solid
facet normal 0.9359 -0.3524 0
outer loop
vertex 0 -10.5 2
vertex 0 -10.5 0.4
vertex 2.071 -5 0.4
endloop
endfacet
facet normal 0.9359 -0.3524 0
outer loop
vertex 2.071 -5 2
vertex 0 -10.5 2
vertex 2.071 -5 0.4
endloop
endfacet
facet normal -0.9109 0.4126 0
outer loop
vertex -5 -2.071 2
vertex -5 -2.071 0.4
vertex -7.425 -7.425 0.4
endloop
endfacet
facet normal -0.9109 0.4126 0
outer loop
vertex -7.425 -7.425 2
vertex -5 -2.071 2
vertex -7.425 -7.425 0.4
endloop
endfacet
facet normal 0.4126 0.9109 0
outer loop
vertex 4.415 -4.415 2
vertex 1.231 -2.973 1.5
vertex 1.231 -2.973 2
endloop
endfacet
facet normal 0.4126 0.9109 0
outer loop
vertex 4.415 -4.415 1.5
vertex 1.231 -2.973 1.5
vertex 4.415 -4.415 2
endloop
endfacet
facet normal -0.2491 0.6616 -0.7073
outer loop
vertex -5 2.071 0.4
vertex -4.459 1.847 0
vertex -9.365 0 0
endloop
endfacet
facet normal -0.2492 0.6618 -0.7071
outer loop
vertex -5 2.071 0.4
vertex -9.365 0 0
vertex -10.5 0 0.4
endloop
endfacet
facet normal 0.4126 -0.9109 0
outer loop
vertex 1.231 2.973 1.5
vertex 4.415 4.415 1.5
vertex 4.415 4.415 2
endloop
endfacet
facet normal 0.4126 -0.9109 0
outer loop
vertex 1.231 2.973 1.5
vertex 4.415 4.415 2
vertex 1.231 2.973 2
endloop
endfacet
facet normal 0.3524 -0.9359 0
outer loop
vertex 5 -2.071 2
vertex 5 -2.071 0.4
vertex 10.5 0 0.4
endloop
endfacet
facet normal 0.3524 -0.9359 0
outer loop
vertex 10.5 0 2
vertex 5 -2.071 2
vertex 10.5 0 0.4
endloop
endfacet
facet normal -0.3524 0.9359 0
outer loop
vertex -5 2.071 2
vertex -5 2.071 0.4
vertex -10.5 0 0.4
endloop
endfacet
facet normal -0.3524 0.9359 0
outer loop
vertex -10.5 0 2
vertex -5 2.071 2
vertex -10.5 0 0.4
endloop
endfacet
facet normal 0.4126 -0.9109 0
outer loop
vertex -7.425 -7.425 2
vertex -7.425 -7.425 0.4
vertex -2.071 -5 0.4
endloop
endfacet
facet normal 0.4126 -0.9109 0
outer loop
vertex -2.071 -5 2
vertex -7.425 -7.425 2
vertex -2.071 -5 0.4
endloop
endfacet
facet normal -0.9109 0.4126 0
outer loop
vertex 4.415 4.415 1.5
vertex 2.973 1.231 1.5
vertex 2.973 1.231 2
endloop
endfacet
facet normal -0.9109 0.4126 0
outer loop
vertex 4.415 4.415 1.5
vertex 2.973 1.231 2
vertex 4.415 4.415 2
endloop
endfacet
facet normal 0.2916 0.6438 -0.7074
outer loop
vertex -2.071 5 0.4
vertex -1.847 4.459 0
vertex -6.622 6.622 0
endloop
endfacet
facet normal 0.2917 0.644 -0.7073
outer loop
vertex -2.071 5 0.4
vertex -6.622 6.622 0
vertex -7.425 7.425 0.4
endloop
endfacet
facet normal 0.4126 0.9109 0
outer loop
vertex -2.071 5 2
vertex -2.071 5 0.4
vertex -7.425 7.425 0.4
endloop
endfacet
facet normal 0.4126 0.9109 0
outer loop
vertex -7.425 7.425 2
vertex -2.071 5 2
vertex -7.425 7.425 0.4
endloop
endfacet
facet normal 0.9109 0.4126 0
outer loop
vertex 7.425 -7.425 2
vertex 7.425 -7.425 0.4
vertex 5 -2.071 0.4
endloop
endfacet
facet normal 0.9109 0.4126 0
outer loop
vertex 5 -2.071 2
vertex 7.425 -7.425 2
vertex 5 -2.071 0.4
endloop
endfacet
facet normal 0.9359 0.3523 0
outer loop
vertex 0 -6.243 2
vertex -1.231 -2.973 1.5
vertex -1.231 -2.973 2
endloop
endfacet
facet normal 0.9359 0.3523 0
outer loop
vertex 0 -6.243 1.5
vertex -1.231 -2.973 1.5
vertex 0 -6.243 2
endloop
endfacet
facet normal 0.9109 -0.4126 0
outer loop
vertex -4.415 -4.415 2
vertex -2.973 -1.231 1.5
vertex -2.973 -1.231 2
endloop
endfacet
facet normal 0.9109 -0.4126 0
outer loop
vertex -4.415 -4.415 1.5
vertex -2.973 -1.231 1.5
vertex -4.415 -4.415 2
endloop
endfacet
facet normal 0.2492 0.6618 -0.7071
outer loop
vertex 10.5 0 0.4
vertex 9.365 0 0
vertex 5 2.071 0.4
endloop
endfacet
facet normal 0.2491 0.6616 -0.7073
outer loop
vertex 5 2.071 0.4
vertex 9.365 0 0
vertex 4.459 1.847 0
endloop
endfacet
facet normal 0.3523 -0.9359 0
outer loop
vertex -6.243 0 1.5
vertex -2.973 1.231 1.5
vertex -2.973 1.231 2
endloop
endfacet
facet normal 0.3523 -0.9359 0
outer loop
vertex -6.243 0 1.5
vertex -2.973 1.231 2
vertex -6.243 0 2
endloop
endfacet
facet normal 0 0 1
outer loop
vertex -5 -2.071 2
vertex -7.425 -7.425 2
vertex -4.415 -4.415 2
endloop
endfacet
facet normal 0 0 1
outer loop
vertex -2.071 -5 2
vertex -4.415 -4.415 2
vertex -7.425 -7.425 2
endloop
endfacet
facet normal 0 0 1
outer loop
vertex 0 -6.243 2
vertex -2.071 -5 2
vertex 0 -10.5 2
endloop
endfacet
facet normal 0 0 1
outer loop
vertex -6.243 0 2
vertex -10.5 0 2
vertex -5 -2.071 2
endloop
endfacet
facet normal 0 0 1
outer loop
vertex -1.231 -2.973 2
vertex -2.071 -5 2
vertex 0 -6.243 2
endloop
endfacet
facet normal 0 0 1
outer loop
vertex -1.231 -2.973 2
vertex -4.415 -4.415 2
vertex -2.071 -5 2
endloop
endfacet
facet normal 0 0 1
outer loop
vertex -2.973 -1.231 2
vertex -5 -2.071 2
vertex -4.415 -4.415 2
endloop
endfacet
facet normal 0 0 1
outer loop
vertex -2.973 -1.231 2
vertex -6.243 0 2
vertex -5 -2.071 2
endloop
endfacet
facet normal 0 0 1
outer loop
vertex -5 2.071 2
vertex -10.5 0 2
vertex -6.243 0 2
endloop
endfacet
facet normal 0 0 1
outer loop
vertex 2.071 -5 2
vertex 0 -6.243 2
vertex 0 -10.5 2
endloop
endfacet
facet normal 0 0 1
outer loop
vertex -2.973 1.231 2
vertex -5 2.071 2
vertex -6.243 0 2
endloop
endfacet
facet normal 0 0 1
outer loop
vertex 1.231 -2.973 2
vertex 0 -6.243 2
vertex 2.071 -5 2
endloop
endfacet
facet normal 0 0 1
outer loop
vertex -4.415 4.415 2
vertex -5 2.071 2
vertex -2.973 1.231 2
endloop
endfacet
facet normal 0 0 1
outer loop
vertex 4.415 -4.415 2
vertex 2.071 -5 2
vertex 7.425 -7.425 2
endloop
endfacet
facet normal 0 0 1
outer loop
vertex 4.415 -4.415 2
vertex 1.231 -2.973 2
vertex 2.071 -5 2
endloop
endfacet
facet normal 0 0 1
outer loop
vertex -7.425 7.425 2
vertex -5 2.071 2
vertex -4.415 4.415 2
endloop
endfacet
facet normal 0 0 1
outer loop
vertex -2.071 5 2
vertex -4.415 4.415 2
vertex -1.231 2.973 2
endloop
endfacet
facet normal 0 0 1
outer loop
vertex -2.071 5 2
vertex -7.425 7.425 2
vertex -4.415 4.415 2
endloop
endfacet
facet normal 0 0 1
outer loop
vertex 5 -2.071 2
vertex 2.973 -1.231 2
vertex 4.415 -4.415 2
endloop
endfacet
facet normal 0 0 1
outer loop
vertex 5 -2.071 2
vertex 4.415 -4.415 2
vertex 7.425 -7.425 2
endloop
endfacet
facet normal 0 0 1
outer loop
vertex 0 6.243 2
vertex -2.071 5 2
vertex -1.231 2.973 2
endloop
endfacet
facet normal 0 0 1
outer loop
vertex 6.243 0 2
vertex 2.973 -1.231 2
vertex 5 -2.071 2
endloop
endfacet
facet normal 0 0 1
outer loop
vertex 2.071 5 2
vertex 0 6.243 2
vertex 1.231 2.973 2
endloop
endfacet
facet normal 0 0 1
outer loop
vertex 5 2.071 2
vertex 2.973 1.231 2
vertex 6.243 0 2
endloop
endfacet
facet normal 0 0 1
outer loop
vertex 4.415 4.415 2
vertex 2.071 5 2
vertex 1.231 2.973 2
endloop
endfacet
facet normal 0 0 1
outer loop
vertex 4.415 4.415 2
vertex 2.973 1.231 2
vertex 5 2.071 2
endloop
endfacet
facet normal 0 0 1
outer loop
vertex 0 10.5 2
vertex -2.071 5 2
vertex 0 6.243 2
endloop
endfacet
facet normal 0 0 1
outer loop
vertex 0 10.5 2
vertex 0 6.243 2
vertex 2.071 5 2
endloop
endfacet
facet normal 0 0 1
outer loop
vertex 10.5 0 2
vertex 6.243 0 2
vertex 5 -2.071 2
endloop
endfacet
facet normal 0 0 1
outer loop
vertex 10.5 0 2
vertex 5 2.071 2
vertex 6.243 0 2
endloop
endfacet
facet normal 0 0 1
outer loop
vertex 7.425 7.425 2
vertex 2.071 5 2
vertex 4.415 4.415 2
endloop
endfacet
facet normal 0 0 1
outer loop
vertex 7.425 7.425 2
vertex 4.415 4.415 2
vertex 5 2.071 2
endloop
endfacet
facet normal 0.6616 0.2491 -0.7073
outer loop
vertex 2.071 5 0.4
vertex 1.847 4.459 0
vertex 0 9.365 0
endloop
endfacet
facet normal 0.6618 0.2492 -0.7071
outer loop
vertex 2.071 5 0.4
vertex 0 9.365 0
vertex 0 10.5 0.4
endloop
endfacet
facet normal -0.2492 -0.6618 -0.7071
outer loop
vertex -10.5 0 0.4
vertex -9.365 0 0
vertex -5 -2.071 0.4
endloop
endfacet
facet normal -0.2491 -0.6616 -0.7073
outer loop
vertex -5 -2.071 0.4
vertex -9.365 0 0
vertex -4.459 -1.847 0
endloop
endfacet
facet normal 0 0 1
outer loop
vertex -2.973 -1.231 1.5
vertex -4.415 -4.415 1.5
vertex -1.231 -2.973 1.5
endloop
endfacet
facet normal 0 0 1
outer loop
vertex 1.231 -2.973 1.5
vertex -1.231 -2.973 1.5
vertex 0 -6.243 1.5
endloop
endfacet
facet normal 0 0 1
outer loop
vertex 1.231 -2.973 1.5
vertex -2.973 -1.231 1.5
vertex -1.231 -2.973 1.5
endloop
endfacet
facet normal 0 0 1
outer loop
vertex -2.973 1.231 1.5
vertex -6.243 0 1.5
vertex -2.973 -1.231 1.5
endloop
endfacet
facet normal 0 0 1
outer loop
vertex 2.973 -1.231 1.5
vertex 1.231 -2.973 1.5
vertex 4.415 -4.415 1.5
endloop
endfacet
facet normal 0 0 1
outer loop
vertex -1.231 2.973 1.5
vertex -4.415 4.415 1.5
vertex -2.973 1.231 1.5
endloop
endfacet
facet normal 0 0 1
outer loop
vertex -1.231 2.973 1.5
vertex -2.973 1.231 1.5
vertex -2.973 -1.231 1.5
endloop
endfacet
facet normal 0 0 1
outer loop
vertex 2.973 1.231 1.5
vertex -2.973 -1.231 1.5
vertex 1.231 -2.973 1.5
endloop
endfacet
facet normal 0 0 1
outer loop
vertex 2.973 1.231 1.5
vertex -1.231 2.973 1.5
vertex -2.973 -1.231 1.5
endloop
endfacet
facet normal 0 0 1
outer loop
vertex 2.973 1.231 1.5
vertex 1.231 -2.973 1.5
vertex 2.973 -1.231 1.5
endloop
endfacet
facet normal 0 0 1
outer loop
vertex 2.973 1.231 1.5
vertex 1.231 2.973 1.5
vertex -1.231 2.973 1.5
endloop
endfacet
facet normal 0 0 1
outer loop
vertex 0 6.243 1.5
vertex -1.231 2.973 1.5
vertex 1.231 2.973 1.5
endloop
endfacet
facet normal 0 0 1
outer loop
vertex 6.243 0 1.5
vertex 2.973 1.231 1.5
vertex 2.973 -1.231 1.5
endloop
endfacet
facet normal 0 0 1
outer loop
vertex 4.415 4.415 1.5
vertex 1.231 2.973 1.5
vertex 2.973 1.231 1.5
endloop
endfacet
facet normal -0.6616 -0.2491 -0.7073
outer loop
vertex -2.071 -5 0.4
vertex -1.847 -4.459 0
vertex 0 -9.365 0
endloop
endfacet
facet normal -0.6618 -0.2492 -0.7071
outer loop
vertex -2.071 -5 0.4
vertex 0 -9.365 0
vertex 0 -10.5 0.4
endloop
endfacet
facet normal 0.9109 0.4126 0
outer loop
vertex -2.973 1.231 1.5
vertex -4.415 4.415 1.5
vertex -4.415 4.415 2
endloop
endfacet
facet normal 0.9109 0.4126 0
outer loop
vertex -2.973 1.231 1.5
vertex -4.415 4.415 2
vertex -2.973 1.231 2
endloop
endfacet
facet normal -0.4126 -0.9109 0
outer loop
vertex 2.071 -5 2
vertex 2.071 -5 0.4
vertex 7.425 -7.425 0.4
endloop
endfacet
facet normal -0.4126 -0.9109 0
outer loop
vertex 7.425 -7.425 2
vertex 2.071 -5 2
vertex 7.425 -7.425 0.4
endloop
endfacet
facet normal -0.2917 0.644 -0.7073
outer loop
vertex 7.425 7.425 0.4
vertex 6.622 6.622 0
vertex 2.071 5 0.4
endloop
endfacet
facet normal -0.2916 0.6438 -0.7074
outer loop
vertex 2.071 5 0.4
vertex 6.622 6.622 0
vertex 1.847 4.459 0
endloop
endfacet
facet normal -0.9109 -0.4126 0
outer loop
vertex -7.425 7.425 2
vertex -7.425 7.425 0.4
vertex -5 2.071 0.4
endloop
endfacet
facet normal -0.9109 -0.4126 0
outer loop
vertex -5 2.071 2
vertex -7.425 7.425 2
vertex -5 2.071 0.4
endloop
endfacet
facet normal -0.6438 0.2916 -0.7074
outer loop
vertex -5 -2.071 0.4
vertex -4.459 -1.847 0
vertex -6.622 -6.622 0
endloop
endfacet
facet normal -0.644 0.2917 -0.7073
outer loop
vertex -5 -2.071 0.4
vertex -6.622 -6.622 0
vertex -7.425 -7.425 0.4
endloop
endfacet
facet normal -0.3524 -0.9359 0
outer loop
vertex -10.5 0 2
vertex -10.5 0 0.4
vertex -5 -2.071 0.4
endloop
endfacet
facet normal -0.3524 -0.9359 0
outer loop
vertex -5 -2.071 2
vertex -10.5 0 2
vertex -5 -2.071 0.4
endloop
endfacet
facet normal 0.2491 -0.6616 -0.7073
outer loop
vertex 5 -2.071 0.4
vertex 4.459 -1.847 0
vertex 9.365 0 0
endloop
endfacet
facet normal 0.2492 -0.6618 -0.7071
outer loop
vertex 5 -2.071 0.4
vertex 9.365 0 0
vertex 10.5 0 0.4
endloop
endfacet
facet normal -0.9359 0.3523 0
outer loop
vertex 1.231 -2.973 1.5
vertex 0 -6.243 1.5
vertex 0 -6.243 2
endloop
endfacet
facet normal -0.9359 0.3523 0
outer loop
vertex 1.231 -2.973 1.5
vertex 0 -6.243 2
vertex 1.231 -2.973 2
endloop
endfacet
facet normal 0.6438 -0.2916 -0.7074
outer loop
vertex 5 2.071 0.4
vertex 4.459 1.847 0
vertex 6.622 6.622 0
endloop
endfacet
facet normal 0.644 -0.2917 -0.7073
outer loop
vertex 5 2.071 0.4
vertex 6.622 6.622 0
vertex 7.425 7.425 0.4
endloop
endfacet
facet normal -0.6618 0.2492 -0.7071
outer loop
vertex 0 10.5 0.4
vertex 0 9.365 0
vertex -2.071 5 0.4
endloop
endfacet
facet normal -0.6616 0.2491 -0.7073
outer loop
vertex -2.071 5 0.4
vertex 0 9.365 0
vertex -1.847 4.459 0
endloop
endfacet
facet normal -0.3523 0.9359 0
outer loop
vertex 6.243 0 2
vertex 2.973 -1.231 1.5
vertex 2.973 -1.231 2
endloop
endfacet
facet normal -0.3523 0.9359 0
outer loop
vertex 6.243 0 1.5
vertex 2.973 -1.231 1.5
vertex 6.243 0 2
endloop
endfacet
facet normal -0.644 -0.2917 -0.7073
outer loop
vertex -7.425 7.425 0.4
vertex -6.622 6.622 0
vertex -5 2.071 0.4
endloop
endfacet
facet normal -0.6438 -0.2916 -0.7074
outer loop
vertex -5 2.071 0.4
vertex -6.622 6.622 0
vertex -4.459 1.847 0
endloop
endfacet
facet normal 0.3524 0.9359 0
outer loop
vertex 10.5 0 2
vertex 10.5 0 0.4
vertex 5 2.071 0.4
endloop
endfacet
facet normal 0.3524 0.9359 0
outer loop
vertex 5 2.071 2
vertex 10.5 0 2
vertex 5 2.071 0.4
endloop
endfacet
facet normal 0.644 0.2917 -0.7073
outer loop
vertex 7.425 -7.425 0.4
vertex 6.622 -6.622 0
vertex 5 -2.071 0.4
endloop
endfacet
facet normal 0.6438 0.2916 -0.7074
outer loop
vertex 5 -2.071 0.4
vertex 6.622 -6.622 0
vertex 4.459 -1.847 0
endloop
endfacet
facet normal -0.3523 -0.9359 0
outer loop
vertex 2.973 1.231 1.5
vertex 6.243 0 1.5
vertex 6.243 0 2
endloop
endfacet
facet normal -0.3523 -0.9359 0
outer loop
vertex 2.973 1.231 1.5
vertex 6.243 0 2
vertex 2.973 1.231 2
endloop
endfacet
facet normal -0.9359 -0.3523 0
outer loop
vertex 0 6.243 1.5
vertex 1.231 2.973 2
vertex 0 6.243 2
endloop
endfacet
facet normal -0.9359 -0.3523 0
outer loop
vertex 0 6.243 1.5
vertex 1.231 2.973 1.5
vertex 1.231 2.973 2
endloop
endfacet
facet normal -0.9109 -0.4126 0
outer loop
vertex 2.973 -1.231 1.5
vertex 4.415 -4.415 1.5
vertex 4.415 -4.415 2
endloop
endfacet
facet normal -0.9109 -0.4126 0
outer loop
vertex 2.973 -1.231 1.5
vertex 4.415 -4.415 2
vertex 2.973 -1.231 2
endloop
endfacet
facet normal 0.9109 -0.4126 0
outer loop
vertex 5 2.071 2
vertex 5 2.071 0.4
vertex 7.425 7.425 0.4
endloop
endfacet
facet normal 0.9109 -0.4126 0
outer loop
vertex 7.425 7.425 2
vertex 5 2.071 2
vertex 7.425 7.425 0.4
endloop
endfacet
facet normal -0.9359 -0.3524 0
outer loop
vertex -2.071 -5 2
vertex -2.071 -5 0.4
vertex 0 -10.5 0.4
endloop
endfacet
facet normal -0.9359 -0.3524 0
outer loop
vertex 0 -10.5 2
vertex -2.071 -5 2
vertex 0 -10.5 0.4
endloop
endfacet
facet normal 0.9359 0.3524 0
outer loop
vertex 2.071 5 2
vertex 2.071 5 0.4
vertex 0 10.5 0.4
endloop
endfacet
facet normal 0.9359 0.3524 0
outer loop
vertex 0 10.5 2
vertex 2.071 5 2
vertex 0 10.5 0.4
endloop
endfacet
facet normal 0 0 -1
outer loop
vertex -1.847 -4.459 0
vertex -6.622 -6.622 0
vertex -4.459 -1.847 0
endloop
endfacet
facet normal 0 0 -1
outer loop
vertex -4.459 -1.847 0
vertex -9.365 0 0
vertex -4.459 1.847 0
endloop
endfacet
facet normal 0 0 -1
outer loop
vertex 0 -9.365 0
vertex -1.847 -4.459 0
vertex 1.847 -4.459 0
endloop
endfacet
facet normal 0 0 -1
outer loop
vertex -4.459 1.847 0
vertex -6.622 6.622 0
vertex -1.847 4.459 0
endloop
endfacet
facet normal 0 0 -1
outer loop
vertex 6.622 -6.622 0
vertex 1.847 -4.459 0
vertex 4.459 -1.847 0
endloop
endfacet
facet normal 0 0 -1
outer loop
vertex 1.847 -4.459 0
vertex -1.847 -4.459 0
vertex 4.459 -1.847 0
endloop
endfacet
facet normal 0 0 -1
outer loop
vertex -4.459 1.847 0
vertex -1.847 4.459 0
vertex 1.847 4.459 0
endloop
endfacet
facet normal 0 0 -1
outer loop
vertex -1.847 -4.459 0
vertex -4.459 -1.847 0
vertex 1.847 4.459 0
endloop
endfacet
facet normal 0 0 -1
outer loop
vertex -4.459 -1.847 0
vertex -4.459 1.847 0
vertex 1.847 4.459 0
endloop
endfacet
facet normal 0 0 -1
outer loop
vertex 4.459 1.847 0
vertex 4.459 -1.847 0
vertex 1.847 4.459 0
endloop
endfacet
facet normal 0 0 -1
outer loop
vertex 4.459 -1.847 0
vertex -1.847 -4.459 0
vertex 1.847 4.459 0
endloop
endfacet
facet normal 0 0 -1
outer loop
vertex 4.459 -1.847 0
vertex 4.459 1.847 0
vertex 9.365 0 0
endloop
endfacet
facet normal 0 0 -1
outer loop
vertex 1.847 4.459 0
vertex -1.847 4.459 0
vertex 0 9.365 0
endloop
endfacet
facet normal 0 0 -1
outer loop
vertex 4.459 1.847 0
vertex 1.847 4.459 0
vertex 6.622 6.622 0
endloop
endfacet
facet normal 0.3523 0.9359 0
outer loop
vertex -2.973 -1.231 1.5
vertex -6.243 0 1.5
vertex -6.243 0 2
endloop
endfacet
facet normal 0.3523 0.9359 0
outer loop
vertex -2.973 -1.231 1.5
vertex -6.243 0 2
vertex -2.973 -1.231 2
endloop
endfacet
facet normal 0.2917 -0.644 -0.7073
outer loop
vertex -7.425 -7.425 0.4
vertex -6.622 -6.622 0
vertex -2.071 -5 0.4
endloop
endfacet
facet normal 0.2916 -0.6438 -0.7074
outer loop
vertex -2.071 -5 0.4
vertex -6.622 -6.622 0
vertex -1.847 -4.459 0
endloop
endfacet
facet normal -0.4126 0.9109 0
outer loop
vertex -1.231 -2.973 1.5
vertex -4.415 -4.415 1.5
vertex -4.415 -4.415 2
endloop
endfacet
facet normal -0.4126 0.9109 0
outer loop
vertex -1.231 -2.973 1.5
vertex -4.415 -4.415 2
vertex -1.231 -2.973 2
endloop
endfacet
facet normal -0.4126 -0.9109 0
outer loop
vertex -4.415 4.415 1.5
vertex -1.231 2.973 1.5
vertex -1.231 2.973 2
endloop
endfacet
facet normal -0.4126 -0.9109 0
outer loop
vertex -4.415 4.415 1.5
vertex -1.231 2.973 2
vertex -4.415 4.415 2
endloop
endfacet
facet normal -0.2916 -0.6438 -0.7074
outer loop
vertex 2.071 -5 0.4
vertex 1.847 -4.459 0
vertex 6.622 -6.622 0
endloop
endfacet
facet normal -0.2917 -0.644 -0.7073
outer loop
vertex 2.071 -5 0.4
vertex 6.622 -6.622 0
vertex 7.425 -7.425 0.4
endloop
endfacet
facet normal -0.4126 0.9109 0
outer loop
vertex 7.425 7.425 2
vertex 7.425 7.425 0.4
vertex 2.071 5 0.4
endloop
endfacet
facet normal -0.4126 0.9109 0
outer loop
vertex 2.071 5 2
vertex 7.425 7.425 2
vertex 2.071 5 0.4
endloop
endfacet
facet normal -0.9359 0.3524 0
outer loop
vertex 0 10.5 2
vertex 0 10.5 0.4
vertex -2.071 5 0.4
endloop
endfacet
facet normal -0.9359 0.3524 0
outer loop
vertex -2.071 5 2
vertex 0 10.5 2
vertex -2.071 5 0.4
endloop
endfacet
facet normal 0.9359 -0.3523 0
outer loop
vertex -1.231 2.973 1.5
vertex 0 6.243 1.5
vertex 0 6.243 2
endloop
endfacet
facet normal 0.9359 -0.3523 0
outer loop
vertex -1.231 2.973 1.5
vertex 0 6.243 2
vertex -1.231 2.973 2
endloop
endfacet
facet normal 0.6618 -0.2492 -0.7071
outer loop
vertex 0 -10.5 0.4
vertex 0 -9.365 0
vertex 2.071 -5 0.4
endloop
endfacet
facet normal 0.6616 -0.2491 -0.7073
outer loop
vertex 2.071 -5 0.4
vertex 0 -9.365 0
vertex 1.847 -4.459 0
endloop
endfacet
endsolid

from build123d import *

# Parameters (mm, degrees)
F1_DEPTH = 2
F2_T     = -1.5
F3_SIZE  = 0.4


with BuildPart() as f1:
    # F0 (on Top) → F1 (new body)
    with BuildSketch(Plane.XY):
        Polygon((0, 10.5), (-2.0710678119, 5), (-7.4246212025, 7.4246212025), (-5, 2.0710678119), (-10.5, 0), (-5, -2.0710678119), (-7.4246212025, -7.4246212025), (-2.0710678119, -5), (0, -10.5), (2.0710678119, -5), (7.4246212025, -7.4246212025), (5, -2.0710678119), (10.5, 0), (5, 2.0710678119), (7.4246212025, 7.4246212025), (2.0710678119, 5), align=None)
    extrude(amount=F1_DEPTH)

    # F2
    f2_openings = [f1.faces().sort_by_distance(p)[0] for p in [
        (0, 0, 2),
    ]]
    offset(amount=F2_T, openings=f2_openings, kind=Kind.INTERSECTION)

    # F3
    f3_edges = [f1.edges().sort_by_distance(p)[0] for p in [
        (6.212311, -4.747845, 0),
        (7.75, -1.035534, 0),
        (7.75, 1.035534, 0),
        (6.212311, 4.747845, 0),
        (4.747845, 6.212311, 0),
        (1.035534, 7.75, 0),
        (-1.035534, 7.75, 0),
        (-4.747845, 6.212311, 0),
        (-6.212311, 4.747845, 0),
        (-7.75, 1.035534, 0),
        (-7.75, -1.035534, 0),
        (-6.212311, -4.747845, 0),
        (-4.747845, -6.212311, 0),
        (-1.035534, -7.75, 0),
        (1.035534, -7.75, 0),
        (4.747845, -6.212311, 0),
    ]]
    chamfer(f3_edges, length=F3_SIZE)


solid = f1.part
